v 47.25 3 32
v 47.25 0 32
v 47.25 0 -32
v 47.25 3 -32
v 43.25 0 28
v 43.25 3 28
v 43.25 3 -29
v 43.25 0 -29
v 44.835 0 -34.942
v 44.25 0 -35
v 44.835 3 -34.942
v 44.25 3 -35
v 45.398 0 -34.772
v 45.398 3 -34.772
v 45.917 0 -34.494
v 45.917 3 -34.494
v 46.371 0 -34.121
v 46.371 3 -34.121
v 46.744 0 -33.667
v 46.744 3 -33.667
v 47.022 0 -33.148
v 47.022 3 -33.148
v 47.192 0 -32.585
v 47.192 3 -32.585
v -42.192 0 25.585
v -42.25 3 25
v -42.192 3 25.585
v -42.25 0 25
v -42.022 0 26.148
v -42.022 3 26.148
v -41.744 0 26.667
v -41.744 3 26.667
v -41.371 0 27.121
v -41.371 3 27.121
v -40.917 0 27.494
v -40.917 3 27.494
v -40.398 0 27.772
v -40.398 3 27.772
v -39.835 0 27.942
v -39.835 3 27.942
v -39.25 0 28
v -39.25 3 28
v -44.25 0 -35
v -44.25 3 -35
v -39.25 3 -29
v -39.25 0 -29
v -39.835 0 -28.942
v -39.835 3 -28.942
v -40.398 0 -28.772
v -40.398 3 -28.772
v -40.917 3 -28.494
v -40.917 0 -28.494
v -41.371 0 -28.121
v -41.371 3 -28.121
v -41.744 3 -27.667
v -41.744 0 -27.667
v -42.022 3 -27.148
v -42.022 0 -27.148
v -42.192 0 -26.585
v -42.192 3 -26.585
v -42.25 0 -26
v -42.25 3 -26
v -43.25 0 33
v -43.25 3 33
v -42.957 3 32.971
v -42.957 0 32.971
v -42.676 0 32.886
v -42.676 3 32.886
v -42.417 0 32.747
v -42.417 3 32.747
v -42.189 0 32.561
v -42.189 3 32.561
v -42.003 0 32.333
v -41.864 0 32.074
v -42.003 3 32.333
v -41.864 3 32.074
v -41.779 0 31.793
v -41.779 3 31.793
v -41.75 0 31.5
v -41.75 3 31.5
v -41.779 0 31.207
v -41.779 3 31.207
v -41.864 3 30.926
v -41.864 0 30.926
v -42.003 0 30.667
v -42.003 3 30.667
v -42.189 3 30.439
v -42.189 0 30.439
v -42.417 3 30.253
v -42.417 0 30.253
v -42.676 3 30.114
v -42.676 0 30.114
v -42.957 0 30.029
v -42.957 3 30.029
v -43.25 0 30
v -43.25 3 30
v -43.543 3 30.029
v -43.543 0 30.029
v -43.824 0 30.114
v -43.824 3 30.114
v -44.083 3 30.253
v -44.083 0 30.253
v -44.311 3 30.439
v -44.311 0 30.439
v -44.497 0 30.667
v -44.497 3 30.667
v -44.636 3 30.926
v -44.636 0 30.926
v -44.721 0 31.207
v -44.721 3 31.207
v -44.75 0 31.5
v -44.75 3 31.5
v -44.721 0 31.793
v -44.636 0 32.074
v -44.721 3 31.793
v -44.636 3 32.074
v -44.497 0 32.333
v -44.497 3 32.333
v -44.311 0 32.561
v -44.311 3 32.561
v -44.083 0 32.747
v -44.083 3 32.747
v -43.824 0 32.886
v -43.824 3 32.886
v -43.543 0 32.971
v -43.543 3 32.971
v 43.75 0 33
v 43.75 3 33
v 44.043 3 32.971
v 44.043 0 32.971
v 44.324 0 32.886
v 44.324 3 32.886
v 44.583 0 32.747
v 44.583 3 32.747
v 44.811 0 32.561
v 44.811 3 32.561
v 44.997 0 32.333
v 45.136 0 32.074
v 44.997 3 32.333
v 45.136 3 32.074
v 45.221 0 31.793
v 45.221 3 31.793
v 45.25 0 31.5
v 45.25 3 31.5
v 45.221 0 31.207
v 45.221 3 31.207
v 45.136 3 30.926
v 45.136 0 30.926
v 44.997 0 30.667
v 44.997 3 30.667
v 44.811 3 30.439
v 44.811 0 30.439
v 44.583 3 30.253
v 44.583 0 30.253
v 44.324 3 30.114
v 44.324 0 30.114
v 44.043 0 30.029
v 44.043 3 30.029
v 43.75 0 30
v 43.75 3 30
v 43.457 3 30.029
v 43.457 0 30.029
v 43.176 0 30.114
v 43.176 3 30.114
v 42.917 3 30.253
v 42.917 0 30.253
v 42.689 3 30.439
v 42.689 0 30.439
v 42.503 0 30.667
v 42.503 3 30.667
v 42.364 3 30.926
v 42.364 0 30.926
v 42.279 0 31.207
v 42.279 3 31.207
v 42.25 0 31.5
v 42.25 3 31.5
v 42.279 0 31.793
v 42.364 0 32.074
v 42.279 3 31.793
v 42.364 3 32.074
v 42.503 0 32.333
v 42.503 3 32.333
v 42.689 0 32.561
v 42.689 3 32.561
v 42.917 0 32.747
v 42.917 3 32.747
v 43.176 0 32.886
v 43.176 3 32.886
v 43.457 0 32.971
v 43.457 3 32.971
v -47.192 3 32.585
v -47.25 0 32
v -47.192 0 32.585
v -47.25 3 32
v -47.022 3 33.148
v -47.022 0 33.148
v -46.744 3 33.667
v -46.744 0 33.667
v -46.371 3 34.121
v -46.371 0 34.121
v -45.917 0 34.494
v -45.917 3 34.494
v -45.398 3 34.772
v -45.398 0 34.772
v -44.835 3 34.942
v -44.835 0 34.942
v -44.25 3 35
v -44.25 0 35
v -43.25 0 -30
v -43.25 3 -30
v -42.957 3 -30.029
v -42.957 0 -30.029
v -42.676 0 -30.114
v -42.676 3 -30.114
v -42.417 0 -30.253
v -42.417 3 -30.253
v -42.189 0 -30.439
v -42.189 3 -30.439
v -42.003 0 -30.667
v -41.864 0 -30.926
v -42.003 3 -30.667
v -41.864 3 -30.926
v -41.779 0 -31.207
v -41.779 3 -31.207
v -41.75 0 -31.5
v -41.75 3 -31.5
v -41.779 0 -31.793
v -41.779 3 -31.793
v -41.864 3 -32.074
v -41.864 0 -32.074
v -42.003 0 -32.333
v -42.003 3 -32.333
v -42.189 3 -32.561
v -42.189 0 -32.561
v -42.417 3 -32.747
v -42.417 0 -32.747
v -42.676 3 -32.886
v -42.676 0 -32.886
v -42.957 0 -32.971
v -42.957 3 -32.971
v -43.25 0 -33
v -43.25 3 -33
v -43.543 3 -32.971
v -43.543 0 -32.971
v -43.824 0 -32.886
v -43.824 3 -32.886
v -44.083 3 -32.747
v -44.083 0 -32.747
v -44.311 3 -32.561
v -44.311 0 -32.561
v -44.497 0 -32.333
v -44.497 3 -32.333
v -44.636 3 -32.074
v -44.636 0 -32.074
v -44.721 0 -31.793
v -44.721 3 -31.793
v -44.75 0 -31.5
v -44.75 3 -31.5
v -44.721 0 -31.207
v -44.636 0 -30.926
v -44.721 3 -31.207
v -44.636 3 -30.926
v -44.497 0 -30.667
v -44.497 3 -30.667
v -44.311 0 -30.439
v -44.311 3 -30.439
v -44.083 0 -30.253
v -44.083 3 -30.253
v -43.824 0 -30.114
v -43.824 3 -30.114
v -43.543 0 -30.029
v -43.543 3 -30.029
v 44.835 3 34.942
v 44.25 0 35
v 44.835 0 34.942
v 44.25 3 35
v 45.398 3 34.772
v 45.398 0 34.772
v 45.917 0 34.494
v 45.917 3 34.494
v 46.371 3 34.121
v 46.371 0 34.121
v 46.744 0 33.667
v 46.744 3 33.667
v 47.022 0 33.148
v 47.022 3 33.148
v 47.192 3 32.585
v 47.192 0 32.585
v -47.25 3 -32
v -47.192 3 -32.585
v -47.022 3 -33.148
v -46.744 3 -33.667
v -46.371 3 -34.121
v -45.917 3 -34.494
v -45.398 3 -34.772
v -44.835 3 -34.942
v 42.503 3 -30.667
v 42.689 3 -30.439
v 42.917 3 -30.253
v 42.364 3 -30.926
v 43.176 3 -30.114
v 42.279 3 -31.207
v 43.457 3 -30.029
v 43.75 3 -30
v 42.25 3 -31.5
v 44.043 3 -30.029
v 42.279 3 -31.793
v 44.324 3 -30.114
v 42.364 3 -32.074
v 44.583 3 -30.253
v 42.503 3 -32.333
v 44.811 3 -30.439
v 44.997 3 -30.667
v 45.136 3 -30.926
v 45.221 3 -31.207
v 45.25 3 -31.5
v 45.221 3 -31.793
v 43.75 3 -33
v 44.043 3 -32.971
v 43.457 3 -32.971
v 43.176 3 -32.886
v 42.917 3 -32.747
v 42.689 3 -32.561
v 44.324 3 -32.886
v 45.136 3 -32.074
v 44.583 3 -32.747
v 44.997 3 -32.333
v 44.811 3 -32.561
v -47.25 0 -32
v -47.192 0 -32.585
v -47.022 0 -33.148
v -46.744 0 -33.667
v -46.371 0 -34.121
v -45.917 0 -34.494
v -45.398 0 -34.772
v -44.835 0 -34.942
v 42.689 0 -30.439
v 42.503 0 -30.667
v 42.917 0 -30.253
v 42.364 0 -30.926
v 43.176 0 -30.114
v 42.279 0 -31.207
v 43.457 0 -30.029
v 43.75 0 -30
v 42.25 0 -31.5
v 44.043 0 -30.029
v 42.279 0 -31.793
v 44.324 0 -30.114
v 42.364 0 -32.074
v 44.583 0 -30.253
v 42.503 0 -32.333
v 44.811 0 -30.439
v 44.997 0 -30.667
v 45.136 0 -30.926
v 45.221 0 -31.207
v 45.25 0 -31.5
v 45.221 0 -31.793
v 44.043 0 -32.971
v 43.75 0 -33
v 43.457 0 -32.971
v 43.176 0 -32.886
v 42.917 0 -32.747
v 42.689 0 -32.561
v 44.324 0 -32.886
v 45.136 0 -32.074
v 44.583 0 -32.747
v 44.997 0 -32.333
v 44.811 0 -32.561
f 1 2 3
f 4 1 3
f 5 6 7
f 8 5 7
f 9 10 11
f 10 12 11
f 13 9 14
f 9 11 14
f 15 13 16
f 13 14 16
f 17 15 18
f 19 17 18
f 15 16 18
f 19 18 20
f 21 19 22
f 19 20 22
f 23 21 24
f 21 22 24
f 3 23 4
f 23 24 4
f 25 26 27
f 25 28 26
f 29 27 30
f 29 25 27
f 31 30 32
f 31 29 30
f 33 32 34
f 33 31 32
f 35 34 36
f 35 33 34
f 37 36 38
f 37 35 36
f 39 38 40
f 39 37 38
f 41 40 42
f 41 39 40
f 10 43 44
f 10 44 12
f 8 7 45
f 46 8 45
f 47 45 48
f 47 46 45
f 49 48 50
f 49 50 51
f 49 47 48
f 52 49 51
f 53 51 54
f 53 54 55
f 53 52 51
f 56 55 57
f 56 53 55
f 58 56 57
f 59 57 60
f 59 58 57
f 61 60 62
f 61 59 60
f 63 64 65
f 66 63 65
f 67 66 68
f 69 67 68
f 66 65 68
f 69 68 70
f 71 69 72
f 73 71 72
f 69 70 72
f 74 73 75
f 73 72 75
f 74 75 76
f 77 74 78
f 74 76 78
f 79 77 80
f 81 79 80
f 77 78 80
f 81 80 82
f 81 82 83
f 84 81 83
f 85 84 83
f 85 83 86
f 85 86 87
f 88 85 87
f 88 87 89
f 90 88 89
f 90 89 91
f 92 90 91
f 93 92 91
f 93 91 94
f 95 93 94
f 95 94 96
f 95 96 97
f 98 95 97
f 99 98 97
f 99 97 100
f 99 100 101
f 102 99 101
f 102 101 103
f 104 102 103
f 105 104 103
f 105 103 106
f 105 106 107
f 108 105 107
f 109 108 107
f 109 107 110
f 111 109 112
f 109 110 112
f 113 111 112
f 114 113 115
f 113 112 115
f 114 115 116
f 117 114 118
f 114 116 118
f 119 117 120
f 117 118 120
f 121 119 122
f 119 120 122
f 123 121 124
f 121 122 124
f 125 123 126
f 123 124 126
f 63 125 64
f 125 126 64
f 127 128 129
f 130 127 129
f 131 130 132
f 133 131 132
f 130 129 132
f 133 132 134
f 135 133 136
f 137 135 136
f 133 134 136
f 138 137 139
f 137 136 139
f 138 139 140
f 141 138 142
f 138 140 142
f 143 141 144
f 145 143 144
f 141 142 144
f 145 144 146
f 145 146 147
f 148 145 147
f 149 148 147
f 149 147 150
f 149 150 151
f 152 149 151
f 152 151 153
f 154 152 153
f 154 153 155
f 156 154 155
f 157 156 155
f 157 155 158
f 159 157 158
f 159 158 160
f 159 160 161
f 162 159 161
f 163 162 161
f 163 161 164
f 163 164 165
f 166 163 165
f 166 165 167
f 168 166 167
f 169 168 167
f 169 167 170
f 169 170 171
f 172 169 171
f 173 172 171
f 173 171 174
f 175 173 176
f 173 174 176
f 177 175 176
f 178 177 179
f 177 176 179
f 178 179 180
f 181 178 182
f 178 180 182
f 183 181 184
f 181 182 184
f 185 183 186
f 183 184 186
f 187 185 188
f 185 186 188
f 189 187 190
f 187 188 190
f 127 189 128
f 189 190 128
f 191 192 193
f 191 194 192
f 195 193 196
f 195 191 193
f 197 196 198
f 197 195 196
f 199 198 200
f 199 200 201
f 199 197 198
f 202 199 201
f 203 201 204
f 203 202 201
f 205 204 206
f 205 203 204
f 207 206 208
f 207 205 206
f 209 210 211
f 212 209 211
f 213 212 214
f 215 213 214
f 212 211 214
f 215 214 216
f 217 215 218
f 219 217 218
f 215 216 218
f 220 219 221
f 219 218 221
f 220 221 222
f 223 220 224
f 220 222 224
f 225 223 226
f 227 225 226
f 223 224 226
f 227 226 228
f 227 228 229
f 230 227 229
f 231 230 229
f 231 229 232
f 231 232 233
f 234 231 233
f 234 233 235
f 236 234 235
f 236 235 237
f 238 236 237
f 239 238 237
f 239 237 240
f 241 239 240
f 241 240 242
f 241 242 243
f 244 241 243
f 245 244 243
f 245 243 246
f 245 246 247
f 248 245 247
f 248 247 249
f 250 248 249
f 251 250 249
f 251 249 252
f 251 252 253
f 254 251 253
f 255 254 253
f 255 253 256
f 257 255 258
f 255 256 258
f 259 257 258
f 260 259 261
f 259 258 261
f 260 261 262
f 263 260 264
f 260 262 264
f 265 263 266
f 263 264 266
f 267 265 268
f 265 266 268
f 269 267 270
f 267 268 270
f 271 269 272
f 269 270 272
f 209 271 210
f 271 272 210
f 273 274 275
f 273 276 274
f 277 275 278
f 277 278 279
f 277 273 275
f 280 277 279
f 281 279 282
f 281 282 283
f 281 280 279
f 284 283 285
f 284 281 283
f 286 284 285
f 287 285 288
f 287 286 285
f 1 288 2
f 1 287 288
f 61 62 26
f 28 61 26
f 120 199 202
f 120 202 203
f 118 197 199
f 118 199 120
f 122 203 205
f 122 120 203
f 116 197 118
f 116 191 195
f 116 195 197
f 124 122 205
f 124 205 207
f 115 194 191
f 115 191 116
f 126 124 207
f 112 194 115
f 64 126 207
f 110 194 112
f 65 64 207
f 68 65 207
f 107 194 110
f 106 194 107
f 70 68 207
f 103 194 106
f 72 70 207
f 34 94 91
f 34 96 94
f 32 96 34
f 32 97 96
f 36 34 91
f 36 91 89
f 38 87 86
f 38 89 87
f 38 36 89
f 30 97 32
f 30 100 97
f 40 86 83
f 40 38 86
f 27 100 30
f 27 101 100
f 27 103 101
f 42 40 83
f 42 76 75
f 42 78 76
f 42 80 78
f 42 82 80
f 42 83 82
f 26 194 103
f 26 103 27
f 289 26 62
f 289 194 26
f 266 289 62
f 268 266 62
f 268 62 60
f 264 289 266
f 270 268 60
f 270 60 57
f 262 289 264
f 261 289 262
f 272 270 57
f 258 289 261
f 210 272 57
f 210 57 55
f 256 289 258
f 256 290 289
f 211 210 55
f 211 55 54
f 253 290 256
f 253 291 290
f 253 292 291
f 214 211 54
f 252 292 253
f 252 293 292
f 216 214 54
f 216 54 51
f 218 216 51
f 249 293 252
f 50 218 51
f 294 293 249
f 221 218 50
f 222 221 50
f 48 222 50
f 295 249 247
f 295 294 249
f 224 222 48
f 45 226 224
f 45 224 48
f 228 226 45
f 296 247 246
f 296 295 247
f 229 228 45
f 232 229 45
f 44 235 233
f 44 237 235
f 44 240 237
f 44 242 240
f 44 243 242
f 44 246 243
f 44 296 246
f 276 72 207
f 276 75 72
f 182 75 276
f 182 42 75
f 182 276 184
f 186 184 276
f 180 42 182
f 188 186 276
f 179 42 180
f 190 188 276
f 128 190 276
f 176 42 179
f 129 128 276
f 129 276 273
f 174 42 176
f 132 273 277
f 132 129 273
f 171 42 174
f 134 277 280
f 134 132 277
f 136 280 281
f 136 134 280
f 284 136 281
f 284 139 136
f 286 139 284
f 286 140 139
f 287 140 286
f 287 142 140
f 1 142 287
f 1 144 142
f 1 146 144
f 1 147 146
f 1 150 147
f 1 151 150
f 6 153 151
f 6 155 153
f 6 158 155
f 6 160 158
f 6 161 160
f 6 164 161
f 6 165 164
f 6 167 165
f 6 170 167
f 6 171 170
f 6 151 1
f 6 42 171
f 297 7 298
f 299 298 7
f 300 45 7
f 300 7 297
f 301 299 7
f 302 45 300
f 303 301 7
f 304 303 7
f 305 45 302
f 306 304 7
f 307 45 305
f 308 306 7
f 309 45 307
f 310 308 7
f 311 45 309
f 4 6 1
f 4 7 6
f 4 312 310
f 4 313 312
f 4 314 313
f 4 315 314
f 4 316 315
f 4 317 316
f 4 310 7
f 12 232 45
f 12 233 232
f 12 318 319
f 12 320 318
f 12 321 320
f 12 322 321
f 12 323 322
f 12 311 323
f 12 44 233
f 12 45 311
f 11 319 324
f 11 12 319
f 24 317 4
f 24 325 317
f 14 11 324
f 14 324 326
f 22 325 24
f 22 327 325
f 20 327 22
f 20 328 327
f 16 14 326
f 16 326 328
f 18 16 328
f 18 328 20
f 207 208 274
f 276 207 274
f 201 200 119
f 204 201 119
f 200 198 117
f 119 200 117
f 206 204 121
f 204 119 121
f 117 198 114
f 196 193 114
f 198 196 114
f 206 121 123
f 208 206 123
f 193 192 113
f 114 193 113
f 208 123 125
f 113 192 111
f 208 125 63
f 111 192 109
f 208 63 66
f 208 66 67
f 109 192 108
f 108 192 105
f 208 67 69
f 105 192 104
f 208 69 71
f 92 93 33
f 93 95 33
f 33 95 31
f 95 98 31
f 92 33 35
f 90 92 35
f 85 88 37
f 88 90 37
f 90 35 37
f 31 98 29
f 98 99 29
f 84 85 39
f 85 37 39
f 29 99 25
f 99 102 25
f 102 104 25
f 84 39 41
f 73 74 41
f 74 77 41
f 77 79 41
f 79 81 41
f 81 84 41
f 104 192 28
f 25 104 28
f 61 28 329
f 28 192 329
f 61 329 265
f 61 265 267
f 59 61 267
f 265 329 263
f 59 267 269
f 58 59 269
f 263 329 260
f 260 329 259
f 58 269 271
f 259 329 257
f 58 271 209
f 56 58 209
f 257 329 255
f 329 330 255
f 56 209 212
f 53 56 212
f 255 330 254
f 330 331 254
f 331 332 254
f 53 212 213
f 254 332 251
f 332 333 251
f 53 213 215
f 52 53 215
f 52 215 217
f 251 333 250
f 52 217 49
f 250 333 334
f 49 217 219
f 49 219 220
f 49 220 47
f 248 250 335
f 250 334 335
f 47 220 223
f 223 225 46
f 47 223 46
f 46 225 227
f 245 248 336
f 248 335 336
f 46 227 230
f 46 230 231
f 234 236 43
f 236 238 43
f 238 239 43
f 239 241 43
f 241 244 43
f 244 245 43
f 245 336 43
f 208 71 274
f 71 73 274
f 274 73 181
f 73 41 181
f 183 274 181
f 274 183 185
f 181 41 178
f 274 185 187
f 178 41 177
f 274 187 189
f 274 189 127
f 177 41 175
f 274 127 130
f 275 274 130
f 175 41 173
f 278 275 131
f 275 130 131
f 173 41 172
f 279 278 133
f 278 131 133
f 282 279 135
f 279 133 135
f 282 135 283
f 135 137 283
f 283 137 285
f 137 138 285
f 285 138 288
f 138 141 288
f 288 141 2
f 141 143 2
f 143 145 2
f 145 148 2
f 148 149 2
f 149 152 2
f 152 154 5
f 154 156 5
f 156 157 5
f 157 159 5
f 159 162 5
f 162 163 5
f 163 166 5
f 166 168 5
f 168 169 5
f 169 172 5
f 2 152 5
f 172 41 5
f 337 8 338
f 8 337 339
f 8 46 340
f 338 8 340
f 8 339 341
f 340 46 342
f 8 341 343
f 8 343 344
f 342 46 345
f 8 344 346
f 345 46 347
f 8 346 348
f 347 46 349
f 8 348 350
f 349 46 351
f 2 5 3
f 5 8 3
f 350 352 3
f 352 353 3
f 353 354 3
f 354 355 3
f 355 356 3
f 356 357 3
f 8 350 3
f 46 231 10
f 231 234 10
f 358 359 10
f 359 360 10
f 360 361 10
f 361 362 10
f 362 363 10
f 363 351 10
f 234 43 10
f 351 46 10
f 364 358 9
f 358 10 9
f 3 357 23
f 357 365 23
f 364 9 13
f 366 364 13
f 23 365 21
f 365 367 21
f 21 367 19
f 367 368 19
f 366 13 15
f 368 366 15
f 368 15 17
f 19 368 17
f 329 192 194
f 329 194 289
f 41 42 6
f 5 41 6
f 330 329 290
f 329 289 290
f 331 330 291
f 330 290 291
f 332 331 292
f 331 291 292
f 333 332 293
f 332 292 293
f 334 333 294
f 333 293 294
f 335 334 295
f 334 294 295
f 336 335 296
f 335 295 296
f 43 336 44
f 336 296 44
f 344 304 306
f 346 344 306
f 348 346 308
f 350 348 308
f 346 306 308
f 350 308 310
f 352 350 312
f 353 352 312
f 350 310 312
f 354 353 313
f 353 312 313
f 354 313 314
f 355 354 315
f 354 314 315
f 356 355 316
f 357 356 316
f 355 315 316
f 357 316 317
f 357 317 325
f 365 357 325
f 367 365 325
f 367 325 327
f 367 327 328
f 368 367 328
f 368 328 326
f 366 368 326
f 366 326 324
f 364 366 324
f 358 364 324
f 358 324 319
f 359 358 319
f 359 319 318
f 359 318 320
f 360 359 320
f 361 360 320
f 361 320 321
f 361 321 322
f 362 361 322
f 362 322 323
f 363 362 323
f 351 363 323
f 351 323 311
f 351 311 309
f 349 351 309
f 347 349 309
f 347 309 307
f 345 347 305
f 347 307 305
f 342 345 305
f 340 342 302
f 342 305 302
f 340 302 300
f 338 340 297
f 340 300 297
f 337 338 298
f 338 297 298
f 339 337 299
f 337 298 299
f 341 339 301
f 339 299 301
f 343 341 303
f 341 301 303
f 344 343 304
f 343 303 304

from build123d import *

# Parameters (mm, degrees)
SKETCH1_W           = 94.5
SKETCH1_H           = 70
BOSS_EXTRUDE1_DEPTH = 3
SKETCH3_R           = 1.5
CUT_EXTRUDE2_DEPTH  = 59.877521177
FILLET2_R           = 3
CUT_EXTRUDE3_DEPTH  = 59.877521177
FILLET3_R           = 3


with BuildPart() as part:
    # Sketch1 → Boss-Extrude1 (new body)
    with BuildSketch(Plane(origin=(0, 0, 0), x_dir=(1, 0, 0), z_dir=(0, 1, 0))):
        Rectangle(SKETCH1_W, SKETCH1_H)
    extrude(amount=BOSS_EXTRUDE1_DEPTH)

    # Sketch3 → Cut-Extrude2 (cut, through all)
    with BuildSketch(Plane(origin=(0, 3, 0), x_dir=(1, 0, 0), z_dir=(0, 1, 0))):
        with Locations(Location((43.75, 31.5, 0), (0, 0, 270))):
            Circle(SKETCH3_R)
        with Locations(Location((-43.25, 31.5, 0), (0, 0, 270))):
            Circle(SKETCH3_R)
        with Locations(Location((-43.25, -31.5, 0), (0, 0, 270))):
            Circle(SKETCH3_R)
        with Locations(Location((43.75, -31.5, 0), (0, 0, 270))):
            Circle(SKETCH3_R)
    extrude(amount=-CUT_EXTRUDE2_DEPTH, mode=Mode.SUBTRACT)

    # Fillet2
    fillet2_edges = [part.edges().sort_by_distance(p)[0] for p in [
        (47.25, 1.5, 35),
        (-47.25, 1.5, 35),
        (-47.25, 1.5, -35),
        (47.25, 1.5, -35),
    ]]
    fillet(fillet2_edges, radius=FILLET2_R)

    # Sketch5 → Cut-Extrude3 (cut, through all)
    with BuildSketch(Plane(origin=(0, 3, 0), x_dir=(1, 0, 0), z_dir=(0, 1, 0))):
        Polygon((43.25, 29), (-42.25, 29), (-42.25, 10), (-42.25, -10), (-42.25, -28), (-35, -28), (43.25, -28), align=None)
    extrude(amount=-CUT_EXTRUDE3_DEPTH, mode=Mode.SUBTRACT)

    # Fillet3
    fillet3_edges = [part.edges().sort_by_distance(p)[0] for p in [
        (-42.25, 1.5, 28),
        (-42.25, 1.5, -29),
    ]]
    fillet(fillet3_edges, radius=FILLET3_R)


solid = part.part
